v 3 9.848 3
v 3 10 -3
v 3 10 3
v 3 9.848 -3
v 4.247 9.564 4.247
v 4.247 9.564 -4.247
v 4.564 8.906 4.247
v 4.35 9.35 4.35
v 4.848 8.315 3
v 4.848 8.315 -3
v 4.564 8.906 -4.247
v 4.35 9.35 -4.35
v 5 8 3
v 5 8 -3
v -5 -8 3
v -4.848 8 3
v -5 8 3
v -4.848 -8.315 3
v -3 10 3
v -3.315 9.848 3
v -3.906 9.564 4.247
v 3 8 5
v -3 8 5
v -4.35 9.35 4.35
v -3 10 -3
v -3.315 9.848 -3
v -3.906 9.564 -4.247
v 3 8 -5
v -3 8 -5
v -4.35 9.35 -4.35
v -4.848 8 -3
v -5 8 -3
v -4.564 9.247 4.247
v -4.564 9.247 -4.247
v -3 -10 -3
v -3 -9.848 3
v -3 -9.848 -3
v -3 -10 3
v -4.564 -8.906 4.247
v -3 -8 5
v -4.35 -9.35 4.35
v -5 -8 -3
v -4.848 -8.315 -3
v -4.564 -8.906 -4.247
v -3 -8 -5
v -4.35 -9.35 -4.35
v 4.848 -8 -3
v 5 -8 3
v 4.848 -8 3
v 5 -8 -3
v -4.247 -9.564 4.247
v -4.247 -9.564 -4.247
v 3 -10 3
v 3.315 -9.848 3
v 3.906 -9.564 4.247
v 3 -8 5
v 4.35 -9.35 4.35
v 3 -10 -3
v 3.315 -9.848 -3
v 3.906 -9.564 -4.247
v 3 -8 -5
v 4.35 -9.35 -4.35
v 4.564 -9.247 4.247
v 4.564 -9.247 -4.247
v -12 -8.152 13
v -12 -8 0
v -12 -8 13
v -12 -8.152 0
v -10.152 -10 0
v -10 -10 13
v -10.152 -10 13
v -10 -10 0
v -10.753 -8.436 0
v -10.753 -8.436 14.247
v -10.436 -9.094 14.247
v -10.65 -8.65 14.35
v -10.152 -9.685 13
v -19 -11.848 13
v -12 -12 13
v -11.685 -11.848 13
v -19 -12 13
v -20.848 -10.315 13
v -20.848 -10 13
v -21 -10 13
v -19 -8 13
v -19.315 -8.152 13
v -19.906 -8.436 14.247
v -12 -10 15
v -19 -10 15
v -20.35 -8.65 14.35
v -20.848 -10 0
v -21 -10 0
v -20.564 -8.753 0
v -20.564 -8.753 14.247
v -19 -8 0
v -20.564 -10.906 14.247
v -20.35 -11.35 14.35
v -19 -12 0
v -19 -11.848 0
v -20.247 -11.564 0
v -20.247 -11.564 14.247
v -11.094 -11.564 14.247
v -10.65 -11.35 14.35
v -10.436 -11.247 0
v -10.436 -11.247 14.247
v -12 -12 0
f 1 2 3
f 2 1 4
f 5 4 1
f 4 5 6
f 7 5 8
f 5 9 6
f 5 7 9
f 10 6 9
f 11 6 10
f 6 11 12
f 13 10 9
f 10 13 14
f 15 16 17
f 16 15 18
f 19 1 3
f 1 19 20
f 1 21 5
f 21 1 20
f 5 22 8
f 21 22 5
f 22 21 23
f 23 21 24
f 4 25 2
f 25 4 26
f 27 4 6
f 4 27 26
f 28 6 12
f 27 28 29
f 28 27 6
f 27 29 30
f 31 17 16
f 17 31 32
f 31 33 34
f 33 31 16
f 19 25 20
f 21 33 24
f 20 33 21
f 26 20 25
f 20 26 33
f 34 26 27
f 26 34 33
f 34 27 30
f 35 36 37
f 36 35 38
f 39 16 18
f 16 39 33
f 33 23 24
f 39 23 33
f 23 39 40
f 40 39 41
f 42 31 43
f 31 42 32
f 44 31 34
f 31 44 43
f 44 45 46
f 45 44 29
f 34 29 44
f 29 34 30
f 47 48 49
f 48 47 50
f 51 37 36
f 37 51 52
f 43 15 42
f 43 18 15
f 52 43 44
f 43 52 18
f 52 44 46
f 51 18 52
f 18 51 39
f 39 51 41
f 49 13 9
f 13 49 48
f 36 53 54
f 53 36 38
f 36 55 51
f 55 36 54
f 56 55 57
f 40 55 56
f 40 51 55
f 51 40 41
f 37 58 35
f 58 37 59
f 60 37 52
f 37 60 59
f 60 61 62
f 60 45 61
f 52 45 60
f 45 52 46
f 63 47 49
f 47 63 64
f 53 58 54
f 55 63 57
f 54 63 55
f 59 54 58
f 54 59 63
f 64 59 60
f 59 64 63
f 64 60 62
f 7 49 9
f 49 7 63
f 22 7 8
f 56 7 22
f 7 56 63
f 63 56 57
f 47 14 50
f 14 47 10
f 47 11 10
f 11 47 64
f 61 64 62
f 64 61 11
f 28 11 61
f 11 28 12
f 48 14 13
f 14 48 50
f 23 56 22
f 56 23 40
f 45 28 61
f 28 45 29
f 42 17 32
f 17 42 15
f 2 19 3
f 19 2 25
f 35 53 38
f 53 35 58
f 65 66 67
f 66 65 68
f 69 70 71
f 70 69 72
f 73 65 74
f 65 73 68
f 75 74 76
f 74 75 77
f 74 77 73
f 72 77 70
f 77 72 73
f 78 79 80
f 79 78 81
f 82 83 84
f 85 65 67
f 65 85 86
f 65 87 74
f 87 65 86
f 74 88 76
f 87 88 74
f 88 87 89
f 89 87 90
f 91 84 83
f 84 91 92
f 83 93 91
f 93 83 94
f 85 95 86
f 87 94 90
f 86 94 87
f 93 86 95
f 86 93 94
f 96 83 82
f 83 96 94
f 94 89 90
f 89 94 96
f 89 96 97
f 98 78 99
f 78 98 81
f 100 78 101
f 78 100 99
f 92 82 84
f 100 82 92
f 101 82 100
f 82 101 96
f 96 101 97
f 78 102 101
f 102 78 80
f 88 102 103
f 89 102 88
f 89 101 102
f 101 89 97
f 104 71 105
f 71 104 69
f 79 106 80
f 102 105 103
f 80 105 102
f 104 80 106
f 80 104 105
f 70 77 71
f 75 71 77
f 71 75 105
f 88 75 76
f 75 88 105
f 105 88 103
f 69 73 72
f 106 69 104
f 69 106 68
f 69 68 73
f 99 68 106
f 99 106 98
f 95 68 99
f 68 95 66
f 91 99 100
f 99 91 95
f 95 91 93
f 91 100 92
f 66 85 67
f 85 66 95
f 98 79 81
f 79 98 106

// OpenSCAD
module fillet(radius, height=100, $fn) {                                     
    //this creates negative of fillet,
    //i.e. thing to be substracted from object
    translate([-radius, -radius, -height/2-0.01])
        difference() {
            cube([radius*2, radius*2, height+0.02]);
            cylinder(r=radius, h=height+0.02, $fn=$fn);
        }
}

module cube_negative_fillet(
        size,
        radius=-1,
        vertical, 
        top,
        bottom,
        $fn=$fn
    ){

    j=[1,0,1,0];

    for (i=[0:3]) {
        if (radius > -1) {
            rotate([0, 0, 90*i])
                translate([size[1-j[i]]/2, size[j[i]]/2, 0])
                    fillet(radius, size[2], $fn=$fn);
        } else {
            rotate([0, 0, 90*i])
                translate([size[1-j[i]]/2, size[j[i]]/2, 0])
                    fillet(vertical[i], size[2], $fn=$fn);
        }
        rotate([90*i, -90, 0])
            translate([size[2]/2, size[j[i]]/2, 0 ])
                fillet(top[i], size[1-j[i]], $fn=$fn);
        rotate([90*(4-i), 90, 0])
            translate([size[2]/2, size[j[i]]/2, 0])
                fillet(bottom[i], size[1-j[i]], $fn=$fn);
    }
}

module cube_fillet_inside(
         size,
				
        radius=-1,
        vertical,
        top,
        bottom,
        $fn=0
    ){
    if (radius == 0) {
        cube(size, center=true);
    } else {
        difference() {
            cube(size, center=true);
            cube_negative_fillet(size, radius, vertical, top, bottom, $fn);
        }
    }
}


module cube_fillet(
        size,
        radius=-1,
        vertical,
        top,
        bottom,
        center=false,
        $fn 
    ){
    if (center) {
        cube_fillet_inside(size, radius, vertical, top, bottom, $fn);
    } else {
        translate([size[0]/2, size[1]/2, size[2]/2])
            cube_fillet_inside(size, radius, vertical, top, bottom, $fn);
    }
}

cube_fillet([10,20,10],2,[2,2,2,2],[2,2,2,2],[2,2,2,2],center=true,$fn=60);

translate([-21,-12,0]) cube_fillet([11,4,15],2,[2,0,0,0],[2,2,2,2],0,center=false,$fn=60);
